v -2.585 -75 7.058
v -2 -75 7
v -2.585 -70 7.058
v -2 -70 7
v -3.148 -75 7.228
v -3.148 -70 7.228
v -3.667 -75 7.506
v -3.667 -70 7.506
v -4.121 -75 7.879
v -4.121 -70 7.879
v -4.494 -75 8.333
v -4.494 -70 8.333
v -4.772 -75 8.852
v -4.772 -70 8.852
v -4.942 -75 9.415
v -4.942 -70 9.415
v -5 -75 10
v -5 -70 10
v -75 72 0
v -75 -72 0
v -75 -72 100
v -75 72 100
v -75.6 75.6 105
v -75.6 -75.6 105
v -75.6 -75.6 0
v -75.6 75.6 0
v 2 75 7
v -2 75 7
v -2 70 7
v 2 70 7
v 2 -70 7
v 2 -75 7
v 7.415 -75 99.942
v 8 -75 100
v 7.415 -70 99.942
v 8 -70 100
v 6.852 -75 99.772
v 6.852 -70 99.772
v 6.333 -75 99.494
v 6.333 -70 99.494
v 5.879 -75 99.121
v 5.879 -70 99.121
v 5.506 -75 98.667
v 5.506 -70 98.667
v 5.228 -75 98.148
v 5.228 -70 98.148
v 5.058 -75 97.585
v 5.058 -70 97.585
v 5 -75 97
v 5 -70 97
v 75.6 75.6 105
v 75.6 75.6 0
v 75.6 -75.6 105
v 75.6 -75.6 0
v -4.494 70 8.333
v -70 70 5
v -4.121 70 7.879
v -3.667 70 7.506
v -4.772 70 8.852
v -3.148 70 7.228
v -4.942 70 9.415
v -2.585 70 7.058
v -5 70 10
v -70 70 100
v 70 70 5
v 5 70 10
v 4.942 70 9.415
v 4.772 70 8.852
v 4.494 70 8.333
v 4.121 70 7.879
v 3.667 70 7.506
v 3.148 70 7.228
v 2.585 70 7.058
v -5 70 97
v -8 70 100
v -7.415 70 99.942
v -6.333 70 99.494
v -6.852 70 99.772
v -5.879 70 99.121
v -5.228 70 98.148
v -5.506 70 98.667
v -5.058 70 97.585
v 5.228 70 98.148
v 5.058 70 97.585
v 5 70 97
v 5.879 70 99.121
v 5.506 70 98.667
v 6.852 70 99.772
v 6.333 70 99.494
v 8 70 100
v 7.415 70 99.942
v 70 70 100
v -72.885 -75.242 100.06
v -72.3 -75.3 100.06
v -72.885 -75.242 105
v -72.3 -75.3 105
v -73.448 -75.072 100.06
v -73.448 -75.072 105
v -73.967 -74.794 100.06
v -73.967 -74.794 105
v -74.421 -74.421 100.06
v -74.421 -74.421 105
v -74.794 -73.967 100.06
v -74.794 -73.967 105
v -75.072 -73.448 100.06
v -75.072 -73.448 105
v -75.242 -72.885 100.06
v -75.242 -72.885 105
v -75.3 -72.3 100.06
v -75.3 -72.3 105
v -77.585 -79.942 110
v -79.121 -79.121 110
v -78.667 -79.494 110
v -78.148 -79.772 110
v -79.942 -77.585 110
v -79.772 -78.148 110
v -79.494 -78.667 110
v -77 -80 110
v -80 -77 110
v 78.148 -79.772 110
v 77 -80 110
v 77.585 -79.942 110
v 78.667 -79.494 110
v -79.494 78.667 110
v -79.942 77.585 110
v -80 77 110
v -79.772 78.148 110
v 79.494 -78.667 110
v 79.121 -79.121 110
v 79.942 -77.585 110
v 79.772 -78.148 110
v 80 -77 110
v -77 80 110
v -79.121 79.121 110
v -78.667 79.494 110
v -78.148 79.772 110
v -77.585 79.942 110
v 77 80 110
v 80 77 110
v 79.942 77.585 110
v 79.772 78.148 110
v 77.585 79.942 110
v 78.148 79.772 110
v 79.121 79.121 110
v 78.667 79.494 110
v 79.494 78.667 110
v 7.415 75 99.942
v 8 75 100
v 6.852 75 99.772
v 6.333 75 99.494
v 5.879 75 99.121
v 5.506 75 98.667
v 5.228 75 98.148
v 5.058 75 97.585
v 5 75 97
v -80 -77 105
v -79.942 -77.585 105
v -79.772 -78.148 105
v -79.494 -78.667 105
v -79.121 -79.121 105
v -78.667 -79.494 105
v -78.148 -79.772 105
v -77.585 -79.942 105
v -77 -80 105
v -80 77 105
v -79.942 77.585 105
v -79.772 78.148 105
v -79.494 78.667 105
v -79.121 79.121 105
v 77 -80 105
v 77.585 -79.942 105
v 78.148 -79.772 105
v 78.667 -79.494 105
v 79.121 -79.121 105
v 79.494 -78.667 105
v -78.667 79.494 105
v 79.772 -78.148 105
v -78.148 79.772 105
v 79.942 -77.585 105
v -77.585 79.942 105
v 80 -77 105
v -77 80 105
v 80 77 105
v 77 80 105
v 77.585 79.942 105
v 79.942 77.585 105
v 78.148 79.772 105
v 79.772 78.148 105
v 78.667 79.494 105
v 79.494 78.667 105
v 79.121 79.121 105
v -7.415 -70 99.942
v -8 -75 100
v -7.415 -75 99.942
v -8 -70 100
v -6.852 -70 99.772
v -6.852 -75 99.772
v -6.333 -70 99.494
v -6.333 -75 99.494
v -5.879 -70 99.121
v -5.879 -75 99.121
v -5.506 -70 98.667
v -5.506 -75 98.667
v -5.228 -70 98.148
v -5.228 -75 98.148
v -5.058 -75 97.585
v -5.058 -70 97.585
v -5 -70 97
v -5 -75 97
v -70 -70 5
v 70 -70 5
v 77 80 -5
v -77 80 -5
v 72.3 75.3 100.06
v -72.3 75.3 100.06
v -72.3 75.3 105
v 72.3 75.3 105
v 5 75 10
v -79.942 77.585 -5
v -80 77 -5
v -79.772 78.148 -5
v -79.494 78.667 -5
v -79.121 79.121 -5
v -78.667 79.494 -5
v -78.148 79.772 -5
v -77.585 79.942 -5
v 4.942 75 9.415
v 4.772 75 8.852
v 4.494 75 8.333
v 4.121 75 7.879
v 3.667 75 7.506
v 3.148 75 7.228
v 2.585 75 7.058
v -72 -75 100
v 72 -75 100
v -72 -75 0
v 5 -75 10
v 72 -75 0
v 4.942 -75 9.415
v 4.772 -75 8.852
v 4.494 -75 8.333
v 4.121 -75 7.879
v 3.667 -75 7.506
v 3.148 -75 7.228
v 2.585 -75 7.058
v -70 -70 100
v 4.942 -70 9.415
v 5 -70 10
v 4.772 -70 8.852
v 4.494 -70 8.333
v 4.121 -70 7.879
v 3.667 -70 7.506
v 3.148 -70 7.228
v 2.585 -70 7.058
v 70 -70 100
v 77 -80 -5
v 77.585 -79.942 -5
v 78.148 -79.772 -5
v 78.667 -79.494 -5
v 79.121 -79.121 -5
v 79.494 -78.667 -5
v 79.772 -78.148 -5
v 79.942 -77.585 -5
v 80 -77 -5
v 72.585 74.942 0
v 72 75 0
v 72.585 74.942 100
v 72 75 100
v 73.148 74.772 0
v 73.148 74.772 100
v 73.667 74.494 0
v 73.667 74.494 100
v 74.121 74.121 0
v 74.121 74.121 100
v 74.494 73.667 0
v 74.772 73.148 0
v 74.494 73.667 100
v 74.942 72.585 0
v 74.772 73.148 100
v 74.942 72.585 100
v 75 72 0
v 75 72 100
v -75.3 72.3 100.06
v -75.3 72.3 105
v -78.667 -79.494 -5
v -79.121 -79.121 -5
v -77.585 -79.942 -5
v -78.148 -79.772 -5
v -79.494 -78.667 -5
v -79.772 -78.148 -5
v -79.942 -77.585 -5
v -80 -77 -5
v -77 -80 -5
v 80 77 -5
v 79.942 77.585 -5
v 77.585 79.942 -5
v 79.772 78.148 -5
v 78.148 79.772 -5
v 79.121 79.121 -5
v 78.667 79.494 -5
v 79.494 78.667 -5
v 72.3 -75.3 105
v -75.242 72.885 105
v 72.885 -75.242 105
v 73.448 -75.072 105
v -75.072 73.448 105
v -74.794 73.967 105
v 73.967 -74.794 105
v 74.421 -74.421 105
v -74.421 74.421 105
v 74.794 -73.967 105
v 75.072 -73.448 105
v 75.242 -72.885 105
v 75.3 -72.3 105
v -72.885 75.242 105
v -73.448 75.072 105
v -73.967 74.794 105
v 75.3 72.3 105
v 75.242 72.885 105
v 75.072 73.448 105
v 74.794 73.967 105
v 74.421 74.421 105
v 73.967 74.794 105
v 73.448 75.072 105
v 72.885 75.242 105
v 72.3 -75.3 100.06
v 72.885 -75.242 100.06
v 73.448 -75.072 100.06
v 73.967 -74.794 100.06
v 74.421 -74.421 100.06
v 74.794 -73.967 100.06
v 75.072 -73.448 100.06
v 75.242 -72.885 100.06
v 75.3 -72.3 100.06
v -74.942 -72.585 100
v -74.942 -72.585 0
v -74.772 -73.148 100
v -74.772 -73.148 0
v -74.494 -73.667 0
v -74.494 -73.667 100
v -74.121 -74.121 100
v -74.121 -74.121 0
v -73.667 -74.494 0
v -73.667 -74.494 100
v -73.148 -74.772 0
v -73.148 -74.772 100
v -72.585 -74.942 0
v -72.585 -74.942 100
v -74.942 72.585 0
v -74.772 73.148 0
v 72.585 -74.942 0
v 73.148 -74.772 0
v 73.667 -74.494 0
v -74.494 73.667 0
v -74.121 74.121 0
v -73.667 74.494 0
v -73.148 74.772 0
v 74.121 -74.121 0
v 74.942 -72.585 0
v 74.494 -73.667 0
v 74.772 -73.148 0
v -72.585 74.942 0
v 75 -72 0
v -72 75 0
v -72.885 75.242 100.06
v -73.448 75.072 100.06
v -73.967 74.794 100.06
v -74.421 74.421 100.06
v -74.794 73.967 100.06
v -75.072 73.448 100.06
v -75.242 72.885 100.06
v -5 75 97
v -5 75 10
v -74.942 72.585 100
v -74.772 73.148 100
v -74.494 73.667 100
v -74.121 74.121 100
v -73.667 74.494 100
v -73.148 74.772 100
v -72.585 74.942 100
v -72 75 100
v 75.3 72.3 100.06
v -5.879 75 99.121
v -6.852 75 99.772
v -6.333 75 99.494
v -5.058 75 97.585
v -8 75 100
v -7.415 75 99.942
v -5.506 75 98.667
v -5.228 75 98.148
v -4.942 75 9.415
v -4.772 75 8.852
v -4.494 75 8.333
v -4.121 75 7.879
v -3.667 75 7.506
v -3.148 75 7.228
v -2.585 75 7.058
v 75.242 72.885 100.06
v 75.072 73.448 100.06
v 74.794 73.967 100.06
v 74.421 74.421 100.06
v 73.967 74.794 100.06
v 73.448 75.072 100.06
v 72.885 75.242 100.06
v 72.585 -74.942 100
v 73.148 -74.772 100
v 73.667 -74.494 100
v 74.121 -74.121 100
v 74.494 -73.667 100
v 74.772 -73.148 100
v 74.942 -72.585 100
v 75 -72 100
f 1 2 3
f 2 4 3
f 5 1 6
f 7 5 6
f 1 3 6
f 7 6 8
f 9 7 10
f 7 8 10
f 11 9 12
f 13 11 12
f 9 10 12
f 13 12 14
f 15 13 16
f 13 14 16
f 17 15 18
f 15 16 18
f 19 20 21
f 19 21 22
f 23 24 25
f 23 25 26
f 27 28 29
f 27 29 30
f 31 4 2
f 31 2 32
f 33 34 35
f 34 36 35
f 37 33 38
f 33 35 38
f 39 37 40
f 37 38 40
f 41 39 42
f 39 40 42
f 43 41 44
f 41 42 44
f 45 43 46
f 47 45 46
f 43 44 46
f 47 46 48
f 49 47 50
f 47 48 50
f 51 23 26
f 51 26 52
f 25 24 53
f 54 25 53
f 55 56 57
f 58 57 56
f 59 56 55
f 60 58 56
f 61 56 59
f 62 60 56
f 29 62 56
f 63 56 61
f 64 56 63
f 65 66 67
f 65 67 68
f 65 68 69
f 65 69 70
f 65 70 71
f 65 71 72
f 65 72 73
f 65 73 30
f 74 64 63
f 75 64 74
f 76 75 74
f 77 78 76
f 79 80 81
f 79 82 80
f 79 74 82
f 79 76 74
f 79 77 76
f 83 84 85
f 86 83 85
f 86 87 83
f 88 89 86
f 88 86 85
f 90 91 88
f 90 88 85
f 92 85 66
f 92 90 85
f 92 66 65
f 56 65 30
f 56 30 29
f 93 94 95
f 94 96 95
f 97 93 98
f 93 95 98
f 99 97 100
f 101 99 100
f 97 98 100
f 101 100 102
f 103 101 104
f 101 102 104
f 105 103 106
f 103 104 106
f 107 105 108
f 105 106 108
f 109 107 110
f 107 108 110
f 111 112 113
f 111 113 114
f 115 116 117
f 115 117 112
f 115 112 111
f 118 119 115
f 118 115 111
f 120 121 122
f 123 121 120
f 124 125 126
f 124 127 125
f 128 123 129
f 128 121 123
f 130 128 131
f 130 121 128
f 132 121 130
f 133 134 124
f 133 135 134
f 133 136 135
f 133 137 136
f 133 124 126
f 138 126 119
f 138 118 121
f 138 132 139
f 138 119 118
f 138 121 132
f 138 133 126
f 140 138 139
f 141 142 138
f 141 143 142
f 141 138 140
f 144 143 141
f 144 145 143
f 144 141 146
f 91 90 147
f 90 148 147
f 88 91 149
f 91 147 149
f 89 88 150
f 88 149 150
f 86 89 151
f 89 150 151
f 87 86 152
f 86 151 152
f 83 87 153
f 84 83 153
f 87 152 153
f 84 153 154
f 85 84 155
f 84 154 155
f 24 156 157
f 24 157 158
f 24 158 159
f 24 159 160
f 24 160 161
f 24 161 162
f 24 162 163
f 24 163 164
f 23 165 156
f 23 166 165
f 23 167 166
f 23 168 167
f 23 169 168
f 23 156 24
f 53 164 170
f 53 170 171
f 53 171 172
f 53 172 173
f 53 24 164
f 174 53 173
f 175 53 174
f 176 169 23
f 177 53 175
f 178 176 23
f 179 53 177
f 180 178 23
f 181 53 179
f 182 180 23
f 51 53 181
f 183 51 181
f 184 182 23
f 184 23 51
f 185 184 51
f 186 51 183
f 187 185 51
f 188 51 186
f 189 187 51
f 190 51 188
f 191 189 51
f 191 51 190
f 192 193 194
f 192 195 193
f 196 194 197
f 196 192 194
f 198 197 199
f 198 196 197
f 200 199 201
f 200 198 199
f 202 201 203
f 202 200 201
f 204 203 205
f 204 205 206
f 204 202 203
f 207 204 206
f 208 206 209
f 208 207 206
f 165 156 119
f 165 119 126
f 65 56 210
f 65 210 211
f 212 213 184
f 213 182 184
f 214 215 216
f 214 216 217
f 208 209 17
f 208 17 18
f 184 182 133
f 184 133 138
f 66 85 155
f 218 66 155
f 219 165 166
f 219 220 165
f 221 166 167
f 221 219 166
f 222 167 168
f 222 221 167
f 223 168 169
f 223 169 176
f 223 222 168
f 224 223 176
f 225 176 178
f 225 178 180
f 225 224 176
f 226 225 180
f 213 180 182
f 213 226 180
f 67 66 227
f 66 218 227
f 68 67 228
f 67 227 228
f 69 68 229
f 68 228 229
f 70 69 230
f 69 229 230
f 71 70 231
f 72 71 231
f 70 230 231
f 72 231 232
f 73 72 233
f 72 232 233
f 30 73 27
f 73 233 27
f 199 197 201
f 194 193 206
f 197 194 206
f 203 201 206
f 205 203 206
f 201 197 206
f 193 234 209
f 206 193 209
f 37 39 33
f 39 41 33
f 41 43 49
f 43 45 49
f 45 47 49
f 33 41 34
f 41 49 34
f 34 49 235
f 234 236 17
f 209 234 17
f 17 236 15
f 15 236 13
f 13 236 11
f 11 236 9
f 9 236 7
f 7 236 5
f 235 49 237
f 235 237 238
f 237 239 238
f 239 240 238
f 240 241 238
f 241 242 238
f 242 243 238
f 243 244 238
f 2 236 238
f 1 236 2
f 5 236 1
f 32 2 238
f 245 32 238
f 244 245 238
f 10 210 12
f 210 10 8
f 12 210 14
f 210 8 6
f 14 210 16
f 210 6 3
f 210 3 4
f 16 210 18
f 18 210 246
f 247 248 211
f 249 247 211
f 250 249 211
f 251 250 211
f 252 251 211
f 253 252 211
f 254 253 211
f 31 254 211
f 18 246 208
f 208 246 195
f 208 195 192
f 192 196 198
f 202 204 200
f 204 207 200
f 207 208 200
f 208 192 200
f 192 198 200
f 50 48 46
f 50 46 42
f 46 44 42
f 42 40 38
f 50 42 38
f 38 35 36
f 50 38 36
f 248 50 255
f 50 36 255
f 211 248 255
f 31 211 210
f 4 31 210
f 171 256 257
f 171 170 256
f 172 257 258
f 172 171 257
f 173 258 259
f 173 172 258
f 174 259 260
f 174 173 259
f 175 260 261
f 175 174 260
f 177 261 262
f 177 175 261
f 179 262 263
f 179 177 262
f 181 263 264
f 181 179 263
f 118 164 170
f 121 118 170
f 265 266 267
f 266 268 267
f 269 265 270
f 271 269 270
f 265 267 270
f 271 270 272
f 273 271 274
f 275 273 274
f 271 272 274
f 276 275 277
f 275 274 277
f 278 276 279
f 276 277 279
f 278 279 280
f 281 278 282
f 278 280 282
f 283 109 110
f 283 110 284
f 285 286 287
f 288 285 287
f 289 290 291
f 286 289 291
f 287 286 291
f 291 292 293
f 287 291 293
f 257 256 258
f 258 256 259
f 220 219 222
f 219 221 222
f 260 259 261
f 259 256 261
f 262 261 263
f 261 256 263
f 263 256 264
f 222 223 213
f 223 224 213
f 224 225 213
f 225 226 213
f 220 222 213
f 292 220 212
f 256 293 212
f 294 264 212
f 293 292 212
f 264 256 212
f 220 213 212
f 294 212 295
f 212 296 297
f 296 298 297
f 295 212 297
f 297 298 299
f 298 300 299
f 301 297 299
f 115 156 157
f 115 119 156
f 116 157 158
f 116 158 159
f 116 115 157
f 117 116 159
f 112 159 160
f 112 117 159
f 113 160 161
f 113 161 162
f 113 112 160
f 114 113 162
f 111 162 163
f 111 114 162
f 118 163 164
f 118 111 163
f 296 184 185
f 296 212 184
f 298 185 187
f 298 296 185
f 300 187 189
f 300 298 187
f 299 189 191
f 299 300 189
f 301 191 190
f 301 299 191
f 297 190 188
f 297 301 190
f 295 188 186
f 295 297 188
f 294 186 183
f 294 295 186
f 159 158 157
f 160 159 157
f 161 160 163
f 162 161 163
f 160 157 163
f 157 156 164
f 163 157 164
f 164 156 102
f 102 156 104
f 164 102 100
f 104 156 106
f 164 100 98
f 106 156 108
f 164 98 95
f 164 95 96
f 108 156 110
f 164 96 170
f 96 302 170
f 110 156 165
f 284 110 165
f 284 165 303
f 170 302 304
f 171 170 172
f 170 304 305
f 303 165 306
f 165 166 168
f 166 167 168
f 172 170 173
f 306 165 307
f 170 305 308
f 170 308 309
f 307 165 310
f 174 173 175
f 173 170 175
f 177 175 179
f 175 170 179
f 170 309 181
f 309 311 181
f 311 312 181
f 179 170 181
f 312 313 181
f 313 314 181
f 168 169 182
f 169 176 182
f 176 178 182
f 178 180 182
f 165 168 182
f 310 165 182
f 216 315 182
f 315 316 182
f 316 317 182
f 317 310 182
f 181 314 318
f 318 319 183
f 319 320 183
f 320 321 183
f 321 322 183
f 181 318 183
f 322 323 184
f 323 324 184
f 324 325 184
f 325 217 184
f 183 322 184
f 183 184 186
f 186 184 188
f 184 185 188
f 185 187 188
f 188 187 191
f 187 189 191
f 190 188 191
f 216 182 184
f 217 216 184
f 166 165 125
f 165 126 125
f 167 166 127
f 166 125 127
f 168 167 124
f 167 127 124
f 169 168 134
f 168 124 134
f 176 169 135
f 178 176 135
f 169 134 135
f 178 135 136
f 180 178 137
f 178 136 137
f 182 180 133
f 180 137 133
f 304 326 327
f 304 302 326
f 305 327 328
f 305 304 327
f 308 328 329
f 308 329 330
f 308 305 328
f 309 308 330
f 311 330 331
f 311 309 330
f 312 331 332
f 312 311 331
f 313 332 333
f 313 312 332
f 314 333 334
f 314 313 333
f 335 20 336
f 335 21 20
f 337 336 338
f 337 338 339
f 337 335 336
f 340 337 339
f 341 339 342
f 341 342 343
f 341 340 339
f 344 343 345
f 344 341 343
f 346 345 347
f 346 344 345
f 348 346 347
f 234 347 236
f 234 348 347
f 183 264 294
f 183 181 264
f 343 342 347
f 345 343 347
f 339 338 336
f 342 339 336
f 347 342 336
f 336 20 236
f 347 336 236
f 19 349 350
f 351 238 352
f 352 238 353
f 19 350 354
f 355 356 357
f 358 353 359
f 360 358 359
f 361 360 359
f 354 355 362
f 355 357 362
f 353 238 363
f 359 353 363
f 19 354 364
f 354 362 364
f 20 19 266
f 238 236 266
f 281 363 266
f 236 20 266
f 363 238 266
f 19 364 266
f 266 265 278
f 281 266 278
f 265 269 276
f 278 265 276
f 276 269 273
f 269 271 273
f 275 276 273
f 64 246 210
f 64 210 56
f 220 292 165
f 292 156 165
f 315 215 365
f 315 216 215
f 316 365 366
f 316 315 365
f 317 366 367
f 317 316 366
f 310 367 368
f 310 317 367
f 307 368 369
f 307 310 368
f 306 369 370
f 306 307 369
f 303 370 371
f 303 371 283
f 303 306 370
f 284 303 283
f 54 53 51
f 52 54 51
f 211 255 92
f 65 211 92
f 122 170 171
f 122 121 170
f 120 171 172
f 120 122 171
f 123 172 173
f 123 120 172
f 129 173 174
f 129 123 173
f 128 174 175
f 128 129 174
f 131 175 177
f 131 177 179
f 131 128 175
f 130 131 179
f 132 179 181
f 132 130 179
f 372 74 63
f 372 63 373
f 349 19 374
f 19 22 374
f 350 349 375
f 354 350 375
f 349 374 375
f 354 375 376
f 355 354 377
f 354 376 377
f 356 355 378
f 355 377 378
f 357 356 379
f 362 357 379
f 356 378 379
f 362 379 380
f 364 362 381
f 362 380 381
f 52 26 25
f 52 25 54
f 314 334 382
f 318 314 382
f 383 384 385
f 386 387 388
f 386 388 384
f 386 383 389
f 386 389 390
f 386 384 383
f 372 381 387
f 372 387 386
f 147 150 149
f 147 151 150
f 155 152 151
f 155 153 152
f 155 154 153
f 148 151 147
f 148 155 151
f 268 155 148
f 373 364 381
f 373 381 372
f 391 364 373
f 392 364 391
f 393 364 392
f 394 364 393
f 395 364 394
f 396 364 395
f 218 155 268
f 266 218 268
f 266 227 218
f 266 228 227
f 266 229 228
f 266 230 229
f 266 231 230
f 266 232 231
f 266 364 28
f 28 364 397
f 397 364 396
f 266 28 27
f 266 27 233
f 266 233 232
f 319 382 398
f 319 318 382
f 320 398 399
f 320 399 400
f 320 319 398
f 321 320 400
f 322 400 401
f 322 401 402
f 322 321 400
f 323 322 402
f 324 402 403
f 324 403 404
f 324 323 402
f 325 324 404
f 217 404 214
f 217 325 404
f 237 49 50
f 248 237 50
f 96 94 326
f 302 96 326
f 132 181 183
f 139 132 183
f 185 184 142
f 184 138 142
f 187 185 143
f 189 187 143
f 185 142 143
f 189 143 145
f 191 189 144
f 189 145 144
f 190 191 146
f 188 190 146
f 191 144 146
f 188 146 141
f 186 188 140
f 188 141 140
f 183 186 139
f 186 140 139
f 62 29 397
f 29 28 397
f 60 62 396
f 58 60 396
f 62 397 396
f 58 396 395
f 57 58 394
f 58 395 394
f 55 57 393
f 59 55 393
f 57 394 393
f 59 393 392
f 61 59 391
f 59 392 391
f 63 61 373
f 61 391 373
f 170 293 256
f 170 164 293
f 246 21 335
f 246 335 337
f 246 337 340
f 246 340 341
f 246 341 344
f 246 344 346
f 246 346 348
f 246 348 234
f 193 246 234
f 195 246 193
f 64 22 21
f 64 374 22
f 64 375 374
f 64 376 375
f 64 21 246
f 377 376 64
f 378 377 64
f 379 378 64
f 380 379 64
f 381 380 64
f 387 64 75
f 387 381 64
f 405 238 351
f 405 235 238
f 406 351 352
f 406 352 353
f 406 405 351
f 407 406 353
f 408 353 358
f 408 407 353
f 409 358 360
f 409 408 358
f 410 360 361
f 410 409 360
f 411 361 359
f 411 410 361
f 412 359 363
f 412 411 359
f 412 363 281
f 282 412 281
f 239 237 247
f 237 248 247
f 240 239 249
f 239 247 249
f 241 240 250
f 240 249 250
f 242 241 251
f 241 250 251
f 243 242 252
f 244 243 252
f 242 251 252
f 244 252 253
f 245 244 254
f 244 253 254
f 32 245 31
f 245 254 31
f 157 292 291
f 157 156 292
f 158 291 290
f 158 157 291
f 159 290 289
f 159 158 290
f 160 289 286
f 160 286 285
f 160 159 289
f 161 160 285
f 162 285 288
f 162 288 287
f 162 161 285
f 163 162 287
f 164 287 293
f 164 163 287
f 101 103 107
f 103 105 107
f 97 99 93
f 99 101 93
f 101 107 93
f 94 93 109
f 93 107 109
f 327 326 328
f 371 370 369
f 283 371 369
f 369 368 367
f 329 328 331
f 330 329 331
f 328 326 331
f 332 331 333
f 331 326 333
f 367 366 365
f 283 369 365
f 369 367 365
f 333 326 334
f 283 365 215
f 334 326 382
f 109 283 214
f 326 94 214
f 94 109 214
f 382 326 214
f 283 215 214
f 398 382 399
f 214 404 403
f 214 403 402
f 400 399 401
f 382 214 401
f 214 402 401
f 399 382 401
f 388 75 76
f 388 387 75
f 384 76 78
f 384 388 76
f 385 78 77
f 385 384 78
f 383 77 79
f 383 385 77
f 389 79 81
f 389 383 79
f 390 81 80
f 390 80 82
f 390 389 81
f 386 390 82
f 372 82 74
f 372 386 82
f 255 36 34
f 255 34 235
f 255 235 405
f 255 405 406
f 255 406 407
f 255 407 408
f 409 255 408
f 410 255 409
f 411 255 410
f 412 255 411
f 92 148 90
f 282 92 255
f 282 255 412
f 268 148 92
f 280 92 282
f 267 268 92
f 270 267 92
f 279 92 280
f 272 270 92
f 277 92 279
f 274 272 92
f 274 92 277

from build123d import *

# Parameters (mm, degrees)
SKETCH_W          = 150
SKETCH_H          = 150
PAD_DEPTH         = 100
SKETCH001_W       = 140
SKETCH001_H       = 140
POCKET_DEPTH      = 95
SKETCH002_W       = 10
SKETCH002_H       = 200
POCKET001_DEPTH   = 93
FILLET_R          = 3
SKETCH003_W       = 160
SKETCH003_H       = 160
PAD001_DEPTH      = 105
PAD001_DEPTH_BACK = 5
SKETCH004_W       = 151.2
SKETCH004_H       = 151.2
POCKET002_DEPTH   = 105
FILLET001_R       = 3
PAD002_START      = 105
SKETCH005_W       = 160
SKETCH005_H       = 160
PAD002_DEPTH      = 5
PAD003_START      = 100.06
SKETCH006_W       = 150.6
SKETCH006_H       = 150.6
PAD003_DEPTH      = 4.94
FILLET002_R       = 3


with BuildPart() as inner_sleeve:
    # Sketch → Pad (new body)
    with BuildSketch(Plane.XY):
        Rectangle(SKETCH_W, SKETCH_H)
    extrude(amount=PAD_DEPTH)

    # Sketch001 (on Face6 of Pad) → Pocket (cut)
    with BuildSketch(Plane.XY.offset(100)):
        Rectangle(SKETCH001_W, SKETCH001_H)
    extrude(amount=-POCKET_DEPTH, mode=Mode.SUBTRACT)

    # Sketch002 (on Face5 of Pocket) → Pocket001 (cut)
    with BuildSketch(Plane.XY.offset(100)):
        Rectangle(SKETCH002_W, SKETCH002_H)
    extrude(amount=-POCKET001_DEPTH, mode=Mode.SUBTRACT)

    # Fillet
    fillet_edges = [inner_sleeve.edges().sort_by_distance(p)[0] for p in [
        (-75, 75, 50),
        (-5, 72.5, 100),
        (5, -72.5, 7),
        (75, 75, 50),
        (-5, 72.5, 7),
        (-5, -72.5, 7),
        (5, 72.5, 7),
        (5, -72.5, 100),
        (-5, -72.5, 100),
        (5, 72.5, 100),
        (-75, -75, 50),
        (75, -75, 50),
    ]]
    fillet(fillet_edges, radius=FILLET_R)


with BuildPart() as box:
    # Sketch003 → Pad001 (new body, two sides)
    with BuildSketch(Plane.XY) as pad001_sk:
        Rectangle(SKETCH003_W, SKETCH003_H)
    extrude(amount=PAD001_DEPTH)
    extrude(pad001_sk.sketch, amount=-PAD001_DEPTH_BACK)

    # Sketch004 (on Face6 of Pad001) → Pocket002 (cut)
    with BuildSketch(Plane.XY.offset(105)):
        Rectangle(SKETCH004_W, SKETCH004_H)
    extrude(amount=-POCKET002_DEPTH, mode=Mode.SUBTRACT)

    # Fillet001
    fillet001_edges = [box.edges().sort_by_distance(p)[0] for p in [
        (-80, 80, 50),
        (-80, -80, 50),
        (80, -80, 50),
        (80, 80, 50),
    ]]
    fillet(fillet001_edges, radius=FILLET001_R)


with BuildPart() as lid:
    # Sketch005 → Pad002 (new body)
    with BuildSketch(Plane.XY.offset(PAD002_START)):
        Rectangle(SKETCH005_W, SKETCH005_H)
    extrude(amount=PAD002_DEPTH)

    # Sketch006 → Pad003 (join)
    with BuildSketch(Plane.XY.offset(PAD003_START)):
        Rectangle(SKETCH006_W, SKETCH006_H)
    extrude(amount=PAD003_DEPTH)

    # Fillet002
    fillet002_edges = [lid.edges().sort_by_distance(p)[0] for p in [
        (80, -80, 107.5),
        (75.3, -75.3, 102.53),
        (75.3, 75.3, 102.53),
        (80, 80, 107.5),
        (-80, 80, 107.5),
        (-75.3, 75.3, 102.53),
        (-80, -80, 107.5),
        (-75.3, -75.3, 102.53),
    ]]
    fillet(fillet002_edges, radius=FILLET002_R)


solid = Compound([inner_sleeve.part, box.part, lid.part])
